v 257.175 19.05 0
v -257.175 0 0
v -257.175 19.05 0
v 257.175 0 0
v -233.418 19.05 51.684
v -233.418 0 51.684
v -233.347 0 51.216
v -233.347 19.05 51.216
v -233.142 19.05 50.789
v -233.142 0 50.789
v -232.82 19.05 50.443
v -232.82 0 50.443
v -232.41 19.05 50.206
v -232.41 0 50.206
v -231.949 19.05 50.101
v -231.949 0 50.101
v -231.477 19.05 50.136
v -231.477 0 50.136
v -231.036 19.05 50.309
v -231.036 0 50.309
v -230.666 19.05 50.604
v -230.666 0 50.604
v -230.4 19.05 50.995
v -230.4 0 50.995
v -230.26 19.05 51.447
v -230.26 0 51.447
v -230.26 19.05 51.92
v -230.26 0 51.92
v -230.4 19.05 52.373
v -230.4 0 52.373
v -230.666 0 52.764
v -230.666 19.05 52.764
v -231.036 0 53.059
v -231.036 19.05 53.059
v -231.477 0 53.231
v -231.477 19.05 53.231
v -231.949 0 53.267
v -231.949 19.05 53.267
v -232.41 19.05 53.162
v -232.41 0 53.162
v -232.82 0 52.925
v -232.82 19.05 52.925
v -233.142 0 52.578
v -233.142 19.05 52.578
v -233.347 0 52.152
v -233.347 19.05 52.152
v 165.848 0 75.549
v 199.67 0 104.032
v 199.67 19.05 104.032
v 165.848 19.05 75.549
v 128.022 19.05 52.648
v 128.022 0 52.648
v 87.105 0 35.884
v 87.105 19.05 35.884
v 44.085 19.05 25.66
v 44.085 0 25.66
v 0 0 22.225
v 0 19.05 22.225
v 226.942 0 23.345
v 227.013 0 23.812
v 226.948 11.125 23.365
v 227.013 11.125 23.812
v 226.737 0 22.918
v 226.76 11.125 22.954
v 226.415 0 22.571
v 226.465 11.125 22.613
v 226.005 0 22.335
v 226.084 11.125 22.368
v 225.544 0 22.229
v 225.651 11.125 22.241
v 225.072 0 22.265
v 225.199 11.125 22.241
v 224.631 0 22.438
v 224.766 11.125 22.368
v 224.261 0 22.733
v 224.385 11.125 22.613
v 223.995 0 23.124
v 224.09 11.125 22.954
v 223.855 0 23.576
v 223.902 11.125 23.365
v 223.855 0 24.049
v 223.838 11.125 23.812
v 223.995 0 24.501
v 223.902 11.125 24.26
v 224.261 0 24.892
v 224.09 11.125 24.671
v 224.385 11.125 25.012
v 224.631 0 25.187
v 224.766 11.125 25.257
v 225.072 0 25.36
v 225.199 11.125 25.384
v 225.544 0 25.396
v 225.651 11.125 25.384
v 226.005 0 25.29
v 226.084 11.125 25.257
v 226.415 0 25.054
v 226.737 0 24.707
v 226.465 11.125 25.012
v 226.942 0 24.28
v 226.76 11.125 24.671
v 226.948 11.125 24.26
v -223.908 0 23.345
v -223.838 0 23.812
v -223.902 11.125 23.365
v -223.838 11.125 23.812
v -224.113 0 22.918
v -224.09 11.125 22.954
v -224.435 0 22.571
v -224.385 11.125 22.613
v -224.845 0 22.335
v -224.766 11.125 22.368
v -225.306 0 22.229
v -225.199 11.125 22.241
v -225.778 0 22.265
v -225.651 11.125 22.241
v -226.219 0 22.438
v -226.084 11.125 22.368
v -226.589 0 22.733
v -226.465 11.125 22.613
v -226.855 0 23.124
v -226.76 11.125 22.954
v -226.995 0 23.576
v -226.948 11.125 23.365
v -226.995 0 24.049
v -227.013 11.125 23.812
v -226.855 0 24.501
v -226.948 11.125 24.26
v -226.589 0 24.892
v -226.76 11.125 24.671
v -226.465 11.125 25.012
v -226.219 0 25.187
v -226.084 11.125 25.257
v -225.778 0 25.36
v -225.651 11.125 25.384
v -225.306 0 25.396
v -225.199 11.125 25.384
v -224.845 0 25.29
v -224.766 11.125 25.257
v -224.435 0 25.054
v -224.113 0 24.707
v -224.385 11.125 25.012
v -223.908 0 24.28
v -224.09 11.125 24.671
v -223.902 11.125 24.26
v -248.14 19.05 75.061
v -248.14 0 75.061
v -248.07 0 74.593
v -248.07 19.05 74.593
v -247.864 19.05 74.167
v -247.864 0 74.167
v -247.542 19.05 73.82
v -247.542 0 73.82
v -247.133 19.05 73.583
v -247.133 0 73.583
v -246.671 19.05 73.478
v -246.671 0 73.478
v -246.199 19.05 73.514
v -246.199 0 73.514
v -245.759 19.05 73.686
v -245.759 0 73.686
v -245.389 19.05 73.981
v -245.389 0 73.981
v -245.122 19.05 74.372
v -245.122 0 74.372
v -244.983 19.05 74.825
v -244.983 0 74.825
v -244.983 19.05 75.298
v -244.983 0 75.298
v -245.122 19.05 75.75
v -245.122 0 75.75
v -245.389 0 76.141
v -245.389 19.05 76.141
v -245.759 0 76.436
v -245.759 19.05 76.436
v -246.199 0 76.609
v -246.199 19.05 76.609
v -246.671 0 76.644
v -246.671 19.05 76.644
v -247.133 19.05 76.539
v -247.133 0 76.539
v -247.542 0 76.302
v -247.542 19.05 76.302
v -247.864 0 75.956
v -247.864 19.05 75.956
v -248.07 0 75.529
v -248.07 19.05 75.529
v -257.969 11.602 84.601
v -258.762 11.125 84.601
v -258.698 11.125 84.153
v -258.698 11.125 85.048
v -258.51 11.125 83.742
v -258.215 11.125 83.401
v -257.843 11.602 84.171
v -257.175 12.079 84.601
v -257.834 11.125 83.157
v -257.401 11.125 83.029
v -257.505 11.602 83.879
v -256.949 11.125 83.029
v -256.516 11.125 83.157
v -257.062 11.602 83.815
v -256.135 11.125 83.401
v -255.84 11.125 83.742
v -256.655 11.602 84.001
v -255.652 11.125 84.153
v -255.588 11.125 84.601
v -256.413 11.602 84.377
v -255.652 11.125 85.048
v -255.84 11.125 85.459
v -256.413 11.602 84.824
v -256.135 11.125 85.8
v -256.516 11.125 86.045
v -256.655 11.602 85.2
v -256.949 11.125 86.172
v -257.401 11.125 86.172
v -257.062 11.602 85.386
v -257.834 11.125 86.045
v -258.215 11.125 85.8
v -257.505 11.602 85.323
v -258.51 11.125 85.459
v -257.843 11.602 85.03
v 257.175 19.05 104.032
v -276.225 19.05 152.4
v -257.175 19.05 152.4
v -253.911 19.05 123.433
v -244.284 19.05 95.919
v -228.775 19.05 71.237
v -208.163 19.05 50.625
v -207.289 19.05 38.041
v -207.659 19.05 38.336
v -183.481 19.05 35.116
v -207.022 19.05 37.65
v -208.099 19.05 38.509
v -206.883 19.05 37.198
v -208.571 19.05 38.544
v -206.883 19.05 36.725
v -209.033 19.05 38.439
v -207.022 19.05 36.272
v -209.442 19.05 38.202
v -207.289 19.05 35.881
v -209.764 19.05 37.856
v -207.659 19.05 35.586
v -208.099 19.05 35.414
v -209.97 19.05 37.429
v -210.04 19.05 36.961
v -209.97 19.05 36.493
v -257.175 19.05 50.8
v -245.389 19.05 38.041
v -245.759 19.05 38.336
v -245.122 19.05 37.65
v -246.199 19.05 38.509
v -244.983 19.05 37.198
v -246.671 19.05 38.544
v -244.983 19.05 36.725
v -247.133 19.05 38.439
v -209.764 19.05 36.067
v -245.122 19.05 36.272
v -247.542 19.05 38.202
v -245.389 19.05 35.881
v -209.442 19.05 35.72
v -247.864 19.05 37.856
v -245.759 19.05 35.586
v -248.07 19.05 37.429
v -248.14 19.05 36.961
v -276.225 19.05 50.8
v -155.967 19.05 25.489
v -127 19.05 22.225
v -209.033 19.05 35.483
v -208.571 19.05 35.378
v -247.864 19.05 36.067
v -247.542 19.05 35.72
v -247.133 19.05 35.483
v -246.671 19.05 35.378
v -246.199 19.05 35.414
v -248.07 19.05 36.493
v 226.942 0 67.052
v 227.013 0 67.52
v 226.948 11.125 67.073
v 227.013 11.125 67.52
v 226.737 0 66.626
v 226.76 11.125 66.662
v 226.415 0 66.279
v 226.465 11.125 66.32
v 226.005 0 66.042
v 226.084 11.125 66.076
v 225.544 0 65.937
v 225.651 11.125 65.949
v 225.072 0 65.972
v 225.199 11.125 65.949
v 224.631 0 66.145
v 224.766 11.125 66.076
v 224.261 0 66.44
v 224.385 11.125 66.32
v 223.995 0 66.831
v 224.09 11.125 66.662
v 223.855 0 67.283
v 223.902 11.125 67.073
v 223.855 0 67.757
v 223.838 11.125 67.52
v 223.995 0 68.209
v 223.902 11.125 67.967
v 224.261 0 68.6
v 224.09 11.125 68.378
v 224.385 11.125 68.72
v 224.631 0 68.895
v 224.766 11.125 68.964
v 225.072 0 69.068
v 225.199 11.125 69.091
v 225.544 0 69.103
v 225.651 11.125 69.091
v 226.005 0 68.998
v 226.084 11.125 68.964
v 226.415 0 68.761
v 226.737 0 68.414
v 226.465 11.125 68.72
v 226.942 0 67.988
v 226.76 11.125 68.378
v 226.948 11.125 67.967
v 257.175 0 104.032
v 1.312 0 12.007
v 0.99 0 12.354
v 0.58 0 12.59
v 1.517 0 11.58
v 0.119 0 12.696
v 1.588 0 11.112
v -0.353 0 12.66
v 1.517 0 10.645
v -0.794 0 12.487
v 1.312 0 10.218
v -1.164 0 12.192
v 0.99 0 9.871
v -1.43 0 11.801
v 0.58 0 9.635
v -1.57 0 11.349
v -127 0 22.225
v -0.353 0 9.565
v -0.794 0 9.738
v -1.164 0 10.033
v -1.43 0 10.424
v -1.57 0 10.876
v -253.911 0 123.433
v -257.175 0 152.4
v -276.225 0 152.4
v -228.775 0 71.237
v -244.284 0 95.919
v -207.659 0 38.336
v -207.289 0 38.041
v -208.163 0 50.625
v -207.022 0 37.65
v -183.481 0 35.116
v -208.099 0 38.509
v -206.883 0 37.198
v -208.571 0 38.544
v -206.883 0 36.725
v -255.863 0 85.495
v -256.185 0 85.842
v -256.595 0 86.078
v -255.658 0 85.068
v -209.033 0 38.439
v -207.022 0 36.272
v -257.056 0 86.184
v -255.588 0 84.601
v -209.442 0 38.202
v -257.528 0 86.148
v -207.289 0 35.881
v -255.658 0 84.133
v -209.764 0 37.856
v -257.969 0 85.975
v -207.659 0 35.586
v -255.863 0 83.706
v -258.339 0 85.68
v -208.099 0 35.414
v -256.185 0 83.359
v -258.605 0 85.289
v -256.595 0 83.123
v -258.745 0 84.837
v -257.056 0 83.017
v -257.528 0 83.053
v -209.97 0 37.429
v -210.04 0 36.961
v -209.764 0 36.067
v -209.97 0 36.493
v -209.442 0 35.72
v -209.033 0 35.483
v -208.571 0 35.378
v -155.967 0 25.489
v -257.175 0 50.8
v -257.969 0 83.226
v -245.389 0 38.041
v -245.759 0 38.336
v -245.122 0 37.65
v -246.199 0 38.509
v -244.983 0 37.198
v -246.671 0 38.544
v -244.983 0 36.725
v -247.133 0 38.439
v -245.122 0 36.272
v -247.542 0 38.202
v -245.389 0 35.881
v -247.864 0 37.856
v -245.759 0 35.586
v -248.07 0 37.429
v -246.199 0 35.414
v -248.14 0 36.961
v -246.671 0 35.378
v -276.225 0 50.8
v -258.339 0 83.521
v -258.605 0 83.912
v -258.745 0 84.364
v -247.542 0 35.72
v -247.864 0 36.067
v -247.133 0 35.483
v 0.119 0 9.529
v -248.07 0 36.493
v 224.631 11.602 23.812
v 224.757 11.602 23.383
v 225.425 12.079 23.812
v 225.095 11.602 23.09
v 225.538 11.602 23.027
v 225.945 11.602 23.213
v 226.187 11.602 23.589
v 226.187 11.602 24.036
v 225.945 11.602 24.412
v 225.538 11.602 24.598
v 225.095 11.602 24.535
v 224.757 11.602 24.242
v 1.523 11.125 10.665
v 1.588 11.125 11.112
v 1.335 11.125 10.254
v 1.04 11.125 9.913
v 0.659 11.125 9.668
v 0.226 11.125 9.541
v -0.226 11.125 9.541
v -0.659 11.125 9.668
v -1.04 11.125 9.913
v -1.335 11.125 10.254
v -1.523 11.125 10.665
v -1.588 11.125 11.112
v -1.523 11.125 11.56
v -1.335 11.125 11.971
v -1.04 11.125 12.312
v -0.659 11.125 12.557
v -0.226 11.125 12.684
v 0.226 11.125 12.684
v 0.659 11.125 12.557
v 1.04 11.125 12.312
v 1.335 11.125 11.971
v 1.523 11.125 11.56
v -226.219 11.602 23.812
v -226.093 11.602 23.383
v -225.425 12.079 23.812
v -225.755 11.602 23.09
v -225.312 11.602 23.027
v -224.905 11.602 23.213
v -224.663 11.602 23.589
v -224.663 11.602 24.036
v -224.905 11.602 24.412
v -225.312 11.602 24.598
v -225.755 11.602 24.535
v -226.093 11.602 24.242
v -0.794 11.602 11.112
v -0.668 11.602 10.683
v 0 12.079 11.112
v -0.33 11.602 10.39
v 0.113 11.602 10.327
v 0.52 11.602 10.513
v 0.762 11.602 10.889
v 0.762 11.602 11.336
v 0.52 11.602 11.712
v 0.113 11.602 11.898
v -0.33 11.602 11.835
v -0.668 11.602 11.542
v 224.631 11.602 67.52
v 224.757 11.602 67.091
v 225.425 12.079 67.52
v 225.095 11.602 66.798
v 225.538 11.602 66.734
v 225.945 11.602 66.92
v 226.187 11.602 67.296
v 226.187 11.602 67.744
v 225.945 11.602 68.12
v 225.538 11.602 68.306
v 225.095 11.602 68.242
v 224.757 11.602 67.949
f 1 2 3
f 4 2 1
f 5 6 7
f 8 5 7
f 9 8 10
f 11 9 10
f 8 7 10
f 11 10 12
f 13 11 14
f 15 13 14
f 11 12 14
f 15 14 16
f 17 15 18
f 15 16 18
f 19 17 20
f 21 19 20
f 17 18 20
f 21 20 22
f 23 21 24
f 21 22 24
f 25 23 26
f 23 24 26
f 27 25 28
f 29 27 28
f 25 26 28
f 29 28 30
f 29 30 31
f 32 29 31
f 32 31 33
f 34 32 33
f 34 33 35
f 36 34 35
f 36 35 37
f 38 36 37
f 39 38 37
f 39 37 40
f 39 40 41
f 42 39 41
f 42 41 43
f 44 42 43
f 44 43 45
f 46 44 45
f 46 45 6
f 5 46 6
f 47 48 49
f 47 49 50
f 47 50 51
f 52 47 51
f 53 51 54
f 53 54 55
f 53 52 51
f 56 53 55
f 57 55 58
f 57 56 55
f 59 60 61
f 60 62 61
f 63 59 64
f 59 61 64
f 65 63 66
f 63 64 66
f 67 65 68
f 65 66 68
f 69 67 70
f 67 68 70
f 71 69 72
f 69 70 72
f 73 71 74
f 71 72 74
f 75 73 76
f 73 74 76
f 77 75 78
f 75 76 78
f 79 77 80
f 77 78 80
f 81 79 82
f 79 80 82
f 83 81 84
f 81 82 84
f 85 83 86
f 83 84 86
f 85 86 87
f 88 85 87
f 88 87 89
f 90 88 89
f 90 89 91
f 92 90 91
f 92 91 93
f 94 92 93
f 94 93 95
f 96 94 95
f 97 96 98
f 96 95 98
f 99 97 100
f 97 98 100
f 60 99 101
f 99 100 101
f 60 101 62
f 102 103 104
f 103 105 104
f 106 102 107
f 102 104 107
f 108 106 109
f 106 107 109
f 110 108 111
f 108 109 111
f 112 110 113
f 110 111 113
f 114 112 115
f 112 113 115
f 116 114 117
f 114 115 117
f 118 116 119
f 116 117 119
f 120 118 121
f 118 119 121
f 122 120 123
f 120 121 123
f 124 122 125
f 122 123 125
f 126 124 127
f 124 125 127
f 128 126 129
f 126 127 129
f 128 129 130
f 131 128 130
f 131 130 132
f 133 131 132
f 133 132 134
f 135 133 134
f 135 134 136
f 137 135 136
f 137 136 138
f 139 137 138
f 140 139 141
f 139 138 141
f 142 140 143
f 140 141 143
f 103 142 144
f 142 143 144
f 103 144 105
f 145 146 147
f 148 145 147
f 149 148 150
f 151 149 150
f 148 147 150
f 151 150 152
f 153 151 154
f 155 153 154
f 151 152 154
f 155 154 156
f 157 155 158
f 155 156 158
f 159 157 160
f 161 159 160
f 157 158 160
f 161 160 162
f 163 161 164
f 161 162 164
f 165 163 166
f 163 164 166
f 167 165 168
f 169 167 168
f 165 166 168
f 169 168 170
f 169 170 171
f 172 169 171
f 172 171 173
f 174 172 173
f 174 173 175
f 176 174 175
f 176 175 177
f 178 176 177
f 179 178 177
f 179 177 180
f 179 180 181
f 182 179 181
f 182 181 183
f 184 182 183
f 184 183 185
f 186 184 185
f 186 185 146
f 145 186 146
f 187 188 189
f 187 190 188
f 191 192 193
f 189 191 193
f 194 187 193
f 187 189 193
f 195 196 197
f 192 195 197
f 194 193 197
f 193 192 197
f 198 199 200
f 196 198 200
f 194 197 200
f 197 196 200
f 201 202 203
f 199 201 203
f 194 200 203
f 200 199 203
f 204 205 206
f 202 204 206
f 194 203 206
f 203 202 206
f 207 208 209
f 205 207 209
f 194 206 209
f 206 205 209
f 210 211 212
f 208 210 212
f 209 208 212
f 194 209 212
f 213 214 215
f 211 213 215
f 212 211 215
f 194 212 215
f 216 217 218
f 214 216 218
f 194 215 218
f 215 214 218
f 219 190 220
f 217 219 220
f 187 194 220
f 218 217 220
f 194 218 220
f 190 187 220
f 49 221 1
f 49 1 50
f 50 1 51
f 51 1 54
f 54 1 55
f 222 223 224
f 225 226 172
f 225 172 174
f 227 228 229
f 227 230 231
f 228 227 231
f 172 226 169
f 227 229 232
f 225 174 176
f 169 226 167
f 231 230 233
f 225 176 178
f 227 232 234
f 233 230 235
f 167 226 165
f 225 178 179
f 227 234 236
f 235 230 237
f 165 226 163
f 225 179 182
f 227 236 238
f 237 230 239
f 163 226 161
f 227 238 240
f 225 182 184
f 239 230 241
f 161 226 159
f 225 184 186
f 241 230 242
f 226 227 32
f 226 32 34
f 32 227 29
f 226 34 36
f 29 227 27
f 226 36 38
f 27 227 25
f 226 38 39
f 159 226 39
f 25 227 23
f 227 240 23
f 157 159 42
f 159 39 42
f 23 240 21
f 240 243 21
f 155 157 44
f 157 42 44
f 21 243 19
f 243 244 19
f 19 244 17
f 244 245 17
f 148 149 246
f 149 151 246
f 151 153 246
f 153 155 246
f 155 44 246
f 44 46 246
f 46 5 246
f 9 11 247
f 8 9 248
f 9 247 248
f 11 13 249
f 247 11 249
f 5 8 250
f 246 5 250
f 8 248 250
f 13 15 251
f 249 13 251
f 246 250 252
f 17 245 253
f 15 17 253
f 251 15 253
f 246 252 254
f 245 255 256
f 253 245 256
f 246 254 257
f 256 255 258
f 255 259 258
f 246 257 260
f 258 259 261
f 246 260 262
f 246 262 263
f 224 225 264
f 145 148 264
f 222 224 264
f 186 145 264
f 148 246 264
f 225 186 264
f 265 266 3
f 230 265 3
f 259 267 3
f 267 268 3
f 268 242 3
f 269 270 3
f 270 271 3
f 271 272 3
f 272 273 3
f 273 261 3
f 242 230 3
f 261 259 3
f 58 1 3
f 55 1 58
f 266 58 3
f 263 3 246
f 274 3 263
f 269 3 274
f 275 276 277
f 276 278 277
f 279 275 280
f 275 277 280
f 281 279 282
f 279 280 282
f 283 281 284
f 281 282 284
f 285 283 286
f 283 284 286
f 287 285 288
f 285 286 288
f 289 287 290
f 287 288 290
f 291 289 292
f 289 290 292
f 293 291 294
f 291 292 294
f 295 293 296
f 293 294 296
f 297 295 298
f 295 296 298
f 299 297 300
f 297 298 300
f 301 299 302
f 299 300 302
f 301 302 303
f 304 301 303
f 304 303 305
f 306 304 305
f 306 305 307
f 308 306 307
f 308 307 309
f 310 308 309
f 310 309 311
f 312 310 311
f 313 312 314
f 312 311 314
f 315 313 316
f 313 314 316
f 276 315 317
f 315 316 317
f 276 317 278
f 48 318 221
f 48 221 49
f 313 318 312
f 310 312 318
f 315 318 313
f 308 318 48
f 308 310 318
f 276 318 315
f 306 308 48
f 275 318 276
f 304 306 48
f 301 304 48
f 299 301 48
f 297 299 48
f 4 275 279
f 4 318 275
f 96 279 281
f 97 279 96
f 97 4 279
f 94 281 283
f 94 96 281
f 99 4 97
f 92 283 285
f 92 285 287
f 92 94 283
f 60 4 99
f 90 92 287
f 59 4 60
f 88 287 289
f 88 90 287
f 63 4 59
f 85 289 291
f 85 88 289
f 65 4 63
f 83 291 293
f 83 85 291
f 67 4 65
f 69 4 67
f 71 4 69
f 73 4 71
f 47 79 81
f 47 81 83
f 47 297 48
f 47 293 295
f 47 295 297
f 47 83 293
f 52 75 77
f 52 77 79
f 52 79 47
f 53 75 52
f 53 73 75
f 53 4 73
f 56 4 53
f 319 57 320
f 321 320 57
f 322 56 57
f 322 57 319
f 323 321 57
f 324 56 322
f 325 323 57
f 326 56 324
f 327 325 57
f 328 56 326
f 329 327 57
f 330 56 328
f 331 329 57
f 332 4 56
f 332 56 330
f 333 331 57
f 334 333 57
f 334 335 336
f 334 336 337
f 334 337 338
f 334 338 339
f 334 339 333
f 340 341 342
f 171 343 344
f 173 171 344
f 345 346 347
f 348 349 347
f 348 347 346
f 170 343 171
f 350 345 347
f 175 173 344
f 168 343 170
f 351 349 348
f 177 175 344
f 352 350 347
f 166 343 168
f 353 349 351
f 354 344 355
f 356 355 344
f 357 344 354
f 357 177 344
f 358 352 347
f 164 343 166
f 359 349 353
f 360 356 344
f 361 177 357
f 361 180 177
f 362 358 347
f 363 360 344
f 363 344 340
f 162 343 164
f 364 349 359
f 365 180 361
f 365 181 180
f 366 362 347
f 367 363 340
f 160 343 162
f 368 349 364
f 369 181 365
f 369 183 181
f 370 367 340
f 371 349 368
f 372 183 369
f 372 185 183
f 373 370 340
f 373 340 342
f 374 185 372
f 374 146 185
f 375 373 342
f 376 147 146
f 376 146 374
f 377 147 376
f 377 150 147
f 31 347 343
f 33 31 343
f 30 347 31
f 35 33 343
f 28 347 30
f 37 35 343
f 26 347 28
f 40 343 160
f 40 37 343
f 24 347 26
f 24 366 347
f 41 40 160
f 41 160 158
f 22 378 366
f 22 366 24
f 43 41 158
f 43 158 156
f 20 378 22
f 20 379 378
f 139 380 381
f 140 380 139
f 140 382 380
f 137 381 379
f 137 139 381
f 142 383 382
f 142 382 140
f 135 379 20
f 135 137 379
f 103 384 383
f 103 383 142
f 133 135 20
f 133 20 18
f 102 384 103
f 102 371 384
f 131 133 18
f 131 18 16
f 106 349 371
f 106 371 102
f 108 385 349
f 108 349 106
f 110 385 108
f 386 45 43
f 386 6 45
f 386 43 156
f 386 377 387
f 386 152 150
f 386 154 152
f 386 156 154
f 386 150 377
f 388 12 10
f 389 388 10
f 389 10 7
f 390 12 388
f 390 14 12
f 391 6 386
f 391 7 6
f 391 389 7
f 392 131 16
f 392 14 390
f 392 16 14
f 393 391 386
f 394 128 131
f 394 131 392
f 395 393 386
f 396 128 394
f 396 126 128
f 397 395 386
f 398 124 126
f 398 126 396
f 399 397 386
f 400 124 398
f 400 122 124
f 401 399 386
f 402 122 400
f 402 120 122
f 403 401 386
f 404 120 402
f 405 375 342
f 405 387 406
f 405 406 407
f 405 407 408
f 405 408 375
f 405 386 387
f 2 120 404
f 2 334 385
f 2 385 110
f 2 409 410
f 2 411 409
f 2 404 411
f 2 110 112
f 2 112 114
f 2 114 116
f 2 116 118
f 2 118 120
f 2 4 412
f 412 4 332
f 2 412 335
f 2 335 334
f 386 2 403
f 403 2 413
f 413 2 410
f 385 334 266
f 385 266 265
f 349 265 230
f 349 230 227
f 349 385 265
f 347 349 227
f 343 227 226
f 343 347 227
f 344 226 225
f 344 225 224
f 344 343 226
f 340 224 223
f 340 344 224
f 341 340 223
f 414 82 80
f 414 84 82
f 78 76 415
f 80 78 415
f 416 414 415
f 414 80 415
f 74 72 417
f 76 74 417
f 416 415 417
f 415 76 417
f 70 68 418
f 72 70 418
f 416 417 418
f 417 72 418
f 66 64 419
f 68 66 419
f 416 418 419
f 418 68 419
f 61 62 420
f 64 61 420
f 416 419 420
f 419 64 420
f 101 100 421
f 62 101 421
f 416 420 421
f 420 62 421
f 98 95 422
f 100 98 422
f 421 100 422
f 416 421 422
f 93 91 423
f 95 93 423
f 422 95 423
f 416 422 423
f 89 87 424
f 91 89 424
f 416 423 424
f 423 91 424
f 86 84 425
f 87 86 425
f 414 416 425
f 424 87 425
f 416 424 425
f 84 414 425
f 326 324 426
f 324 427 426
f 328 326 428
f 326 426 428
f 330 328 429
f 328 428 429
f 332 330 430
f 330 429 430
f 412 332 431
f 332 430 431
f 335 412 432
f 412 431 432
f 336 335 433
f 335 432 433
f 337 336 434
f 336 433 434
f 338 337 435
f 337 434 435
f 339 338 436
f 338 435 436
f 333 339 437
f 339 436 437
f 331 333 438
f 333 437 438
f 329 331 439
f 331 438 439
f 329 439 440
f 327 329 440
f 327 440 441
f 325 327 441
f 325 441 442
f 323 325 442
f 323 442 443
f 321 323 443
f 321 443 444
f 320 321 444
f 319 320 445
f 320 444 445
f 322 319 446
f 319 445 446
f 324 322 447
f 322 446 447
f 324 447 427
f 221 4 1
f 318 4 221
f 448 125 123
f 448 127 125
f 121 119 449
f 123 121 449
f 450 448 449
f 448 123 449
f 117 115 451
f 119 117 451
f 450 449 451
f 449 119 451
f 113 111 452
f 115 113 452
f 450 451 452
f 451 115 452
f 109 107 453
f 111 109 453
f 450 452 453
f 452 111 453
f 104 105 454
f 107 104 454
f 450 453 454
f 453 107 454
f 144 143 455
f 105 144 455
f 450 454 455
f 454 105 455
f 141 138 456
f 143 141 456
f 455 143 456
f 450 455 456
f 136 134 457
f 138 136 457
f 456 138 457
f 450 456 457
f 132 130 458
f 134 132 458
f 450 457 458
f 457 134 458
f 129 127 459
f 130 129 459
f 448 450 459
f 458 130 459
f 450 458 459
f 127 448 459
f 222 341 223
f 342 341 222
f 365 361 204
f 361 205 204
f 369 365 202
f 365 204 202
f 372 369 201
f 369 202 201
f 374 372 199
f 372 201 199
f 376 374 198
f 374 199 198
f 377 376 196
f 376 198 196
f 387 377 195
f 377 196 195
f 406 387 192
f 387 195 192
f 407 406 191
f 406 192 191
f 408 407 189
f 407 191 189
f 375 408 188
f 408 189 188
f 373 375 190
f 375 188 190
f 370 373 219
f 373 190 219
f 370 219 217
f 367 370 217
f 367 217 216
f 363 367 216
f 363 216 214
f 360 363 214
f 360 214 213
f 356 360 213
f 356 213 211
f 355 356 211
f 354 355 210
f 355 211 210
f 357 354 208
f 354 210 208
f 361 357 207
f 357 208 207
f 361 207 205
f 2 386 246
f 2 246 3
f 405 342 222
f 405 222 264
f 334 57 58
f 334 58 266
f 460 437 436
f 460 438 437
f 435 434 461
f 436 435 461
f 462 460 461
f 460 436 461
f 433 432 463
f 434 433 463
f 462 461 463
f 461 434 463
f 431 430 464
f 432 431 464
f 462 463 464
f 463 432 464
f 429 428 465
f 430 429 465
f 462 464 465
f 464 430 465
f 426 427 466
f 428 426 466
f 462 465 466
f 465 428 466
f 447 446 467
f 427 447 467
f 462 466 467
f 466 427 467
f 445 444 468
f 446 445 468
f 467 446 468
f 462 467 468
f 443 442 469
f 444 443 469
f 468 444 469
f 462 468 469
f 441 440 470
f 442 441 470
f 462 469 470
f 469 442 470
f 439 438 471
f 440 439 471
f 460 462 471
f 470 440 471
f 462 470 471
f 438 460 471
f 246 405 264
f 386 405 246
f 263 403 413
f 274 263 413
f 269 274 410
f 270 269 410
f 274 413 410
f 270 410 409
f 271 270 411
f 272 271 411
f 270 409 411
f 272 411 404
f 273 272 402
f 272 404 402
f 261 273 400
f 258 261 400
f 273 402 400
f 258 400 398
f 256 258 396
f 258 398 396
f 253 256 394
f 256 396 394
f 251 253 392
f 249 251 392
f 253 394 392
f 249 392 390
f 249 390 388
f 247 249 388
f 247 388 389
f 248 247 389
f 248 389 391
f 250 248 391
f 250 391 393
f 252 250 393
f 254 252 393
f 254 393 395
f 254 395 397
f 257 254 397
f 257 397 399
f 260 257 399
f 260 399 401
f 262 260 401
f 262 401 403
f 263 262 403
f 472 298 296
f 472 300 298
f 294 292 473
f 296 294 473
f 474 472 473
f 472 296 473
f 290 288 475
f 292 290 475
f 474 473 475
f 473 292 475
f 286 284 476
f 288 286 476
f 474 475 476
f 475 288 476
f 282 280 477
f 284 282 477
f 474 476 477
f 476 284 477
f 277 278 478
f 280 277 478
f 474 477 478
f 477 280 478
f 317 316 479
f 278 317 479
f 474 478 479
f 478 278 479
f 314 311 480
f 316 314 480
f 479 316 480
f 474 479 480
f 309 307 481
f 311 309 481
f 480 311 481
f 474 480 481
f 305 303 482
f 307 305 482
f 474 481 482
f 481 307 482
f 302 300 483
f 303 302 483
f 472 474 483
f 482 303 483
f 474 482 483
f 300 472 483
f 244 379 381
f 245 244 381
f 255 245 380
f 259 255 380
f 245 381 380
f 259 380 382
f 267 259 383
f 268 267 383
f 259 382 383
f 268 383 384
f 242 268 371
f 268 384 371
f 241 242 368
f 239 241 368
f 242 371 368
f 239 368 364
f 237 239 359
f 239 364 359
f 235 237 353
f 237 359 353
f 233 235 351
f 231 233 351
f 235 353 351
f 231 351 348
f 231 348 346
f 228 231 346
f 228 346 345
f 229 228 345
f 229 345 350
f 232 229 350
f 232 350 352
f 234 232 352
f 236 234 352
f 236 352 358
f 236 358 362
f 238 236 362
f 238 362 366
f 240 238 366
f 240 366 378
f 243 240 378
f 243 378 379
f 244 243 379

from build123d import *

# Parameters (mm, degrees)
BOSS_EXTRUDE1_DEPTH              = 19.05
F_1_8_0_125_DIAMETER_HOLE1_D     = 3.175
F_1_8_0_125_DIAMETER_HOLE1_DEPTH = 11.1252
F_1_8_0_125_DIAMETER_HOLE1_TIP   = 0.953866233
F_1_8_0_125_DIAMETER_HOLE2_D     = 3.175


with BuildPart() as part:
    # Sketch1 → Boss-Extrude1 (new body)
    with BuildSketch(Plane(origin=(0, 0, 0), x_dir=(1, 0, 0), z_dir=(0, 1, 0))):
        with BuildLine():
            Line((-257.175, 0), (257.175, 0))
            Line((257.175, 0), (257.175, -104.032493436))
            Line((257.175, -104.032493436), (199.670208733, -104.032493436))
            ThreePointArc((199.670208733, -104.032493436), (107.889594305, -43.469891278), (0, -22.225))
            Line((0, -22.225), (-127, -22.225))
            ThreePointArc((-127, -22.225), (-219.047625241, -60.352374759), (-257.175, -152.4))
            Line((-257.175, -152.4), (-276.225, -152.4))
            Line((-276.225, -152.4), (-276.225, -50.8))
            Line((-276.225, -50.8), (-257.175, -50.8))
            Line((-257.175, -50.8), (-257.175, 0))
        make_face()
    extrude(amount=BOSS_EXTRUDE1_DEPTH)

    # 1/8 (0.125) Diameter Hole1
    with Locations(Plane(origin=(0, 0, 0), x_dir=(-1, 0, 0), z_dir=(0, -1, 0))):
        with Locations((0, -11.1125), (225.425, -23.8125), (-225.425, -23.8125), (-225.425, -67.519993436), (257.175, -84.6005531)):
            Hole(F_1_8_0_125_DIAMETER_HOLE1_D / 2, depth=F_1_8_0_125_DIAMETER_HOLE1_DEPTH)
            with Locations((0, 0, -(F_1_8_0_125_DIAMETER_HOLE1_DEPTH + F_1_8_0_125_DIAMETER_HOLE1_TIP / 2))):  # 118° drill point
                Cone(0, F_1_8_0_125_DIAMETER_HOLE1_D / 2, F_1_8_0_125_DIAMETER_HOLE1_TIP, mode=Mode.SUBTRACT)

    # 1/8 (0.125) Diameter Hole2 (through all)
    with Locations(Plane(origin=(0, 19.05, 0), x_dir=(1, 0, 0), z_dir=(0, 1, 0))):
        with Locations((-246.552544448, -36.961239505), (-208.452544448, -36.961239505), (-246.552544448, -75.061239505), (-231.830017346, -51.683766607)):
            Hole(F_1_8_0_125_DIAMETER_HOLE2_D / 2)


solid = part.part
